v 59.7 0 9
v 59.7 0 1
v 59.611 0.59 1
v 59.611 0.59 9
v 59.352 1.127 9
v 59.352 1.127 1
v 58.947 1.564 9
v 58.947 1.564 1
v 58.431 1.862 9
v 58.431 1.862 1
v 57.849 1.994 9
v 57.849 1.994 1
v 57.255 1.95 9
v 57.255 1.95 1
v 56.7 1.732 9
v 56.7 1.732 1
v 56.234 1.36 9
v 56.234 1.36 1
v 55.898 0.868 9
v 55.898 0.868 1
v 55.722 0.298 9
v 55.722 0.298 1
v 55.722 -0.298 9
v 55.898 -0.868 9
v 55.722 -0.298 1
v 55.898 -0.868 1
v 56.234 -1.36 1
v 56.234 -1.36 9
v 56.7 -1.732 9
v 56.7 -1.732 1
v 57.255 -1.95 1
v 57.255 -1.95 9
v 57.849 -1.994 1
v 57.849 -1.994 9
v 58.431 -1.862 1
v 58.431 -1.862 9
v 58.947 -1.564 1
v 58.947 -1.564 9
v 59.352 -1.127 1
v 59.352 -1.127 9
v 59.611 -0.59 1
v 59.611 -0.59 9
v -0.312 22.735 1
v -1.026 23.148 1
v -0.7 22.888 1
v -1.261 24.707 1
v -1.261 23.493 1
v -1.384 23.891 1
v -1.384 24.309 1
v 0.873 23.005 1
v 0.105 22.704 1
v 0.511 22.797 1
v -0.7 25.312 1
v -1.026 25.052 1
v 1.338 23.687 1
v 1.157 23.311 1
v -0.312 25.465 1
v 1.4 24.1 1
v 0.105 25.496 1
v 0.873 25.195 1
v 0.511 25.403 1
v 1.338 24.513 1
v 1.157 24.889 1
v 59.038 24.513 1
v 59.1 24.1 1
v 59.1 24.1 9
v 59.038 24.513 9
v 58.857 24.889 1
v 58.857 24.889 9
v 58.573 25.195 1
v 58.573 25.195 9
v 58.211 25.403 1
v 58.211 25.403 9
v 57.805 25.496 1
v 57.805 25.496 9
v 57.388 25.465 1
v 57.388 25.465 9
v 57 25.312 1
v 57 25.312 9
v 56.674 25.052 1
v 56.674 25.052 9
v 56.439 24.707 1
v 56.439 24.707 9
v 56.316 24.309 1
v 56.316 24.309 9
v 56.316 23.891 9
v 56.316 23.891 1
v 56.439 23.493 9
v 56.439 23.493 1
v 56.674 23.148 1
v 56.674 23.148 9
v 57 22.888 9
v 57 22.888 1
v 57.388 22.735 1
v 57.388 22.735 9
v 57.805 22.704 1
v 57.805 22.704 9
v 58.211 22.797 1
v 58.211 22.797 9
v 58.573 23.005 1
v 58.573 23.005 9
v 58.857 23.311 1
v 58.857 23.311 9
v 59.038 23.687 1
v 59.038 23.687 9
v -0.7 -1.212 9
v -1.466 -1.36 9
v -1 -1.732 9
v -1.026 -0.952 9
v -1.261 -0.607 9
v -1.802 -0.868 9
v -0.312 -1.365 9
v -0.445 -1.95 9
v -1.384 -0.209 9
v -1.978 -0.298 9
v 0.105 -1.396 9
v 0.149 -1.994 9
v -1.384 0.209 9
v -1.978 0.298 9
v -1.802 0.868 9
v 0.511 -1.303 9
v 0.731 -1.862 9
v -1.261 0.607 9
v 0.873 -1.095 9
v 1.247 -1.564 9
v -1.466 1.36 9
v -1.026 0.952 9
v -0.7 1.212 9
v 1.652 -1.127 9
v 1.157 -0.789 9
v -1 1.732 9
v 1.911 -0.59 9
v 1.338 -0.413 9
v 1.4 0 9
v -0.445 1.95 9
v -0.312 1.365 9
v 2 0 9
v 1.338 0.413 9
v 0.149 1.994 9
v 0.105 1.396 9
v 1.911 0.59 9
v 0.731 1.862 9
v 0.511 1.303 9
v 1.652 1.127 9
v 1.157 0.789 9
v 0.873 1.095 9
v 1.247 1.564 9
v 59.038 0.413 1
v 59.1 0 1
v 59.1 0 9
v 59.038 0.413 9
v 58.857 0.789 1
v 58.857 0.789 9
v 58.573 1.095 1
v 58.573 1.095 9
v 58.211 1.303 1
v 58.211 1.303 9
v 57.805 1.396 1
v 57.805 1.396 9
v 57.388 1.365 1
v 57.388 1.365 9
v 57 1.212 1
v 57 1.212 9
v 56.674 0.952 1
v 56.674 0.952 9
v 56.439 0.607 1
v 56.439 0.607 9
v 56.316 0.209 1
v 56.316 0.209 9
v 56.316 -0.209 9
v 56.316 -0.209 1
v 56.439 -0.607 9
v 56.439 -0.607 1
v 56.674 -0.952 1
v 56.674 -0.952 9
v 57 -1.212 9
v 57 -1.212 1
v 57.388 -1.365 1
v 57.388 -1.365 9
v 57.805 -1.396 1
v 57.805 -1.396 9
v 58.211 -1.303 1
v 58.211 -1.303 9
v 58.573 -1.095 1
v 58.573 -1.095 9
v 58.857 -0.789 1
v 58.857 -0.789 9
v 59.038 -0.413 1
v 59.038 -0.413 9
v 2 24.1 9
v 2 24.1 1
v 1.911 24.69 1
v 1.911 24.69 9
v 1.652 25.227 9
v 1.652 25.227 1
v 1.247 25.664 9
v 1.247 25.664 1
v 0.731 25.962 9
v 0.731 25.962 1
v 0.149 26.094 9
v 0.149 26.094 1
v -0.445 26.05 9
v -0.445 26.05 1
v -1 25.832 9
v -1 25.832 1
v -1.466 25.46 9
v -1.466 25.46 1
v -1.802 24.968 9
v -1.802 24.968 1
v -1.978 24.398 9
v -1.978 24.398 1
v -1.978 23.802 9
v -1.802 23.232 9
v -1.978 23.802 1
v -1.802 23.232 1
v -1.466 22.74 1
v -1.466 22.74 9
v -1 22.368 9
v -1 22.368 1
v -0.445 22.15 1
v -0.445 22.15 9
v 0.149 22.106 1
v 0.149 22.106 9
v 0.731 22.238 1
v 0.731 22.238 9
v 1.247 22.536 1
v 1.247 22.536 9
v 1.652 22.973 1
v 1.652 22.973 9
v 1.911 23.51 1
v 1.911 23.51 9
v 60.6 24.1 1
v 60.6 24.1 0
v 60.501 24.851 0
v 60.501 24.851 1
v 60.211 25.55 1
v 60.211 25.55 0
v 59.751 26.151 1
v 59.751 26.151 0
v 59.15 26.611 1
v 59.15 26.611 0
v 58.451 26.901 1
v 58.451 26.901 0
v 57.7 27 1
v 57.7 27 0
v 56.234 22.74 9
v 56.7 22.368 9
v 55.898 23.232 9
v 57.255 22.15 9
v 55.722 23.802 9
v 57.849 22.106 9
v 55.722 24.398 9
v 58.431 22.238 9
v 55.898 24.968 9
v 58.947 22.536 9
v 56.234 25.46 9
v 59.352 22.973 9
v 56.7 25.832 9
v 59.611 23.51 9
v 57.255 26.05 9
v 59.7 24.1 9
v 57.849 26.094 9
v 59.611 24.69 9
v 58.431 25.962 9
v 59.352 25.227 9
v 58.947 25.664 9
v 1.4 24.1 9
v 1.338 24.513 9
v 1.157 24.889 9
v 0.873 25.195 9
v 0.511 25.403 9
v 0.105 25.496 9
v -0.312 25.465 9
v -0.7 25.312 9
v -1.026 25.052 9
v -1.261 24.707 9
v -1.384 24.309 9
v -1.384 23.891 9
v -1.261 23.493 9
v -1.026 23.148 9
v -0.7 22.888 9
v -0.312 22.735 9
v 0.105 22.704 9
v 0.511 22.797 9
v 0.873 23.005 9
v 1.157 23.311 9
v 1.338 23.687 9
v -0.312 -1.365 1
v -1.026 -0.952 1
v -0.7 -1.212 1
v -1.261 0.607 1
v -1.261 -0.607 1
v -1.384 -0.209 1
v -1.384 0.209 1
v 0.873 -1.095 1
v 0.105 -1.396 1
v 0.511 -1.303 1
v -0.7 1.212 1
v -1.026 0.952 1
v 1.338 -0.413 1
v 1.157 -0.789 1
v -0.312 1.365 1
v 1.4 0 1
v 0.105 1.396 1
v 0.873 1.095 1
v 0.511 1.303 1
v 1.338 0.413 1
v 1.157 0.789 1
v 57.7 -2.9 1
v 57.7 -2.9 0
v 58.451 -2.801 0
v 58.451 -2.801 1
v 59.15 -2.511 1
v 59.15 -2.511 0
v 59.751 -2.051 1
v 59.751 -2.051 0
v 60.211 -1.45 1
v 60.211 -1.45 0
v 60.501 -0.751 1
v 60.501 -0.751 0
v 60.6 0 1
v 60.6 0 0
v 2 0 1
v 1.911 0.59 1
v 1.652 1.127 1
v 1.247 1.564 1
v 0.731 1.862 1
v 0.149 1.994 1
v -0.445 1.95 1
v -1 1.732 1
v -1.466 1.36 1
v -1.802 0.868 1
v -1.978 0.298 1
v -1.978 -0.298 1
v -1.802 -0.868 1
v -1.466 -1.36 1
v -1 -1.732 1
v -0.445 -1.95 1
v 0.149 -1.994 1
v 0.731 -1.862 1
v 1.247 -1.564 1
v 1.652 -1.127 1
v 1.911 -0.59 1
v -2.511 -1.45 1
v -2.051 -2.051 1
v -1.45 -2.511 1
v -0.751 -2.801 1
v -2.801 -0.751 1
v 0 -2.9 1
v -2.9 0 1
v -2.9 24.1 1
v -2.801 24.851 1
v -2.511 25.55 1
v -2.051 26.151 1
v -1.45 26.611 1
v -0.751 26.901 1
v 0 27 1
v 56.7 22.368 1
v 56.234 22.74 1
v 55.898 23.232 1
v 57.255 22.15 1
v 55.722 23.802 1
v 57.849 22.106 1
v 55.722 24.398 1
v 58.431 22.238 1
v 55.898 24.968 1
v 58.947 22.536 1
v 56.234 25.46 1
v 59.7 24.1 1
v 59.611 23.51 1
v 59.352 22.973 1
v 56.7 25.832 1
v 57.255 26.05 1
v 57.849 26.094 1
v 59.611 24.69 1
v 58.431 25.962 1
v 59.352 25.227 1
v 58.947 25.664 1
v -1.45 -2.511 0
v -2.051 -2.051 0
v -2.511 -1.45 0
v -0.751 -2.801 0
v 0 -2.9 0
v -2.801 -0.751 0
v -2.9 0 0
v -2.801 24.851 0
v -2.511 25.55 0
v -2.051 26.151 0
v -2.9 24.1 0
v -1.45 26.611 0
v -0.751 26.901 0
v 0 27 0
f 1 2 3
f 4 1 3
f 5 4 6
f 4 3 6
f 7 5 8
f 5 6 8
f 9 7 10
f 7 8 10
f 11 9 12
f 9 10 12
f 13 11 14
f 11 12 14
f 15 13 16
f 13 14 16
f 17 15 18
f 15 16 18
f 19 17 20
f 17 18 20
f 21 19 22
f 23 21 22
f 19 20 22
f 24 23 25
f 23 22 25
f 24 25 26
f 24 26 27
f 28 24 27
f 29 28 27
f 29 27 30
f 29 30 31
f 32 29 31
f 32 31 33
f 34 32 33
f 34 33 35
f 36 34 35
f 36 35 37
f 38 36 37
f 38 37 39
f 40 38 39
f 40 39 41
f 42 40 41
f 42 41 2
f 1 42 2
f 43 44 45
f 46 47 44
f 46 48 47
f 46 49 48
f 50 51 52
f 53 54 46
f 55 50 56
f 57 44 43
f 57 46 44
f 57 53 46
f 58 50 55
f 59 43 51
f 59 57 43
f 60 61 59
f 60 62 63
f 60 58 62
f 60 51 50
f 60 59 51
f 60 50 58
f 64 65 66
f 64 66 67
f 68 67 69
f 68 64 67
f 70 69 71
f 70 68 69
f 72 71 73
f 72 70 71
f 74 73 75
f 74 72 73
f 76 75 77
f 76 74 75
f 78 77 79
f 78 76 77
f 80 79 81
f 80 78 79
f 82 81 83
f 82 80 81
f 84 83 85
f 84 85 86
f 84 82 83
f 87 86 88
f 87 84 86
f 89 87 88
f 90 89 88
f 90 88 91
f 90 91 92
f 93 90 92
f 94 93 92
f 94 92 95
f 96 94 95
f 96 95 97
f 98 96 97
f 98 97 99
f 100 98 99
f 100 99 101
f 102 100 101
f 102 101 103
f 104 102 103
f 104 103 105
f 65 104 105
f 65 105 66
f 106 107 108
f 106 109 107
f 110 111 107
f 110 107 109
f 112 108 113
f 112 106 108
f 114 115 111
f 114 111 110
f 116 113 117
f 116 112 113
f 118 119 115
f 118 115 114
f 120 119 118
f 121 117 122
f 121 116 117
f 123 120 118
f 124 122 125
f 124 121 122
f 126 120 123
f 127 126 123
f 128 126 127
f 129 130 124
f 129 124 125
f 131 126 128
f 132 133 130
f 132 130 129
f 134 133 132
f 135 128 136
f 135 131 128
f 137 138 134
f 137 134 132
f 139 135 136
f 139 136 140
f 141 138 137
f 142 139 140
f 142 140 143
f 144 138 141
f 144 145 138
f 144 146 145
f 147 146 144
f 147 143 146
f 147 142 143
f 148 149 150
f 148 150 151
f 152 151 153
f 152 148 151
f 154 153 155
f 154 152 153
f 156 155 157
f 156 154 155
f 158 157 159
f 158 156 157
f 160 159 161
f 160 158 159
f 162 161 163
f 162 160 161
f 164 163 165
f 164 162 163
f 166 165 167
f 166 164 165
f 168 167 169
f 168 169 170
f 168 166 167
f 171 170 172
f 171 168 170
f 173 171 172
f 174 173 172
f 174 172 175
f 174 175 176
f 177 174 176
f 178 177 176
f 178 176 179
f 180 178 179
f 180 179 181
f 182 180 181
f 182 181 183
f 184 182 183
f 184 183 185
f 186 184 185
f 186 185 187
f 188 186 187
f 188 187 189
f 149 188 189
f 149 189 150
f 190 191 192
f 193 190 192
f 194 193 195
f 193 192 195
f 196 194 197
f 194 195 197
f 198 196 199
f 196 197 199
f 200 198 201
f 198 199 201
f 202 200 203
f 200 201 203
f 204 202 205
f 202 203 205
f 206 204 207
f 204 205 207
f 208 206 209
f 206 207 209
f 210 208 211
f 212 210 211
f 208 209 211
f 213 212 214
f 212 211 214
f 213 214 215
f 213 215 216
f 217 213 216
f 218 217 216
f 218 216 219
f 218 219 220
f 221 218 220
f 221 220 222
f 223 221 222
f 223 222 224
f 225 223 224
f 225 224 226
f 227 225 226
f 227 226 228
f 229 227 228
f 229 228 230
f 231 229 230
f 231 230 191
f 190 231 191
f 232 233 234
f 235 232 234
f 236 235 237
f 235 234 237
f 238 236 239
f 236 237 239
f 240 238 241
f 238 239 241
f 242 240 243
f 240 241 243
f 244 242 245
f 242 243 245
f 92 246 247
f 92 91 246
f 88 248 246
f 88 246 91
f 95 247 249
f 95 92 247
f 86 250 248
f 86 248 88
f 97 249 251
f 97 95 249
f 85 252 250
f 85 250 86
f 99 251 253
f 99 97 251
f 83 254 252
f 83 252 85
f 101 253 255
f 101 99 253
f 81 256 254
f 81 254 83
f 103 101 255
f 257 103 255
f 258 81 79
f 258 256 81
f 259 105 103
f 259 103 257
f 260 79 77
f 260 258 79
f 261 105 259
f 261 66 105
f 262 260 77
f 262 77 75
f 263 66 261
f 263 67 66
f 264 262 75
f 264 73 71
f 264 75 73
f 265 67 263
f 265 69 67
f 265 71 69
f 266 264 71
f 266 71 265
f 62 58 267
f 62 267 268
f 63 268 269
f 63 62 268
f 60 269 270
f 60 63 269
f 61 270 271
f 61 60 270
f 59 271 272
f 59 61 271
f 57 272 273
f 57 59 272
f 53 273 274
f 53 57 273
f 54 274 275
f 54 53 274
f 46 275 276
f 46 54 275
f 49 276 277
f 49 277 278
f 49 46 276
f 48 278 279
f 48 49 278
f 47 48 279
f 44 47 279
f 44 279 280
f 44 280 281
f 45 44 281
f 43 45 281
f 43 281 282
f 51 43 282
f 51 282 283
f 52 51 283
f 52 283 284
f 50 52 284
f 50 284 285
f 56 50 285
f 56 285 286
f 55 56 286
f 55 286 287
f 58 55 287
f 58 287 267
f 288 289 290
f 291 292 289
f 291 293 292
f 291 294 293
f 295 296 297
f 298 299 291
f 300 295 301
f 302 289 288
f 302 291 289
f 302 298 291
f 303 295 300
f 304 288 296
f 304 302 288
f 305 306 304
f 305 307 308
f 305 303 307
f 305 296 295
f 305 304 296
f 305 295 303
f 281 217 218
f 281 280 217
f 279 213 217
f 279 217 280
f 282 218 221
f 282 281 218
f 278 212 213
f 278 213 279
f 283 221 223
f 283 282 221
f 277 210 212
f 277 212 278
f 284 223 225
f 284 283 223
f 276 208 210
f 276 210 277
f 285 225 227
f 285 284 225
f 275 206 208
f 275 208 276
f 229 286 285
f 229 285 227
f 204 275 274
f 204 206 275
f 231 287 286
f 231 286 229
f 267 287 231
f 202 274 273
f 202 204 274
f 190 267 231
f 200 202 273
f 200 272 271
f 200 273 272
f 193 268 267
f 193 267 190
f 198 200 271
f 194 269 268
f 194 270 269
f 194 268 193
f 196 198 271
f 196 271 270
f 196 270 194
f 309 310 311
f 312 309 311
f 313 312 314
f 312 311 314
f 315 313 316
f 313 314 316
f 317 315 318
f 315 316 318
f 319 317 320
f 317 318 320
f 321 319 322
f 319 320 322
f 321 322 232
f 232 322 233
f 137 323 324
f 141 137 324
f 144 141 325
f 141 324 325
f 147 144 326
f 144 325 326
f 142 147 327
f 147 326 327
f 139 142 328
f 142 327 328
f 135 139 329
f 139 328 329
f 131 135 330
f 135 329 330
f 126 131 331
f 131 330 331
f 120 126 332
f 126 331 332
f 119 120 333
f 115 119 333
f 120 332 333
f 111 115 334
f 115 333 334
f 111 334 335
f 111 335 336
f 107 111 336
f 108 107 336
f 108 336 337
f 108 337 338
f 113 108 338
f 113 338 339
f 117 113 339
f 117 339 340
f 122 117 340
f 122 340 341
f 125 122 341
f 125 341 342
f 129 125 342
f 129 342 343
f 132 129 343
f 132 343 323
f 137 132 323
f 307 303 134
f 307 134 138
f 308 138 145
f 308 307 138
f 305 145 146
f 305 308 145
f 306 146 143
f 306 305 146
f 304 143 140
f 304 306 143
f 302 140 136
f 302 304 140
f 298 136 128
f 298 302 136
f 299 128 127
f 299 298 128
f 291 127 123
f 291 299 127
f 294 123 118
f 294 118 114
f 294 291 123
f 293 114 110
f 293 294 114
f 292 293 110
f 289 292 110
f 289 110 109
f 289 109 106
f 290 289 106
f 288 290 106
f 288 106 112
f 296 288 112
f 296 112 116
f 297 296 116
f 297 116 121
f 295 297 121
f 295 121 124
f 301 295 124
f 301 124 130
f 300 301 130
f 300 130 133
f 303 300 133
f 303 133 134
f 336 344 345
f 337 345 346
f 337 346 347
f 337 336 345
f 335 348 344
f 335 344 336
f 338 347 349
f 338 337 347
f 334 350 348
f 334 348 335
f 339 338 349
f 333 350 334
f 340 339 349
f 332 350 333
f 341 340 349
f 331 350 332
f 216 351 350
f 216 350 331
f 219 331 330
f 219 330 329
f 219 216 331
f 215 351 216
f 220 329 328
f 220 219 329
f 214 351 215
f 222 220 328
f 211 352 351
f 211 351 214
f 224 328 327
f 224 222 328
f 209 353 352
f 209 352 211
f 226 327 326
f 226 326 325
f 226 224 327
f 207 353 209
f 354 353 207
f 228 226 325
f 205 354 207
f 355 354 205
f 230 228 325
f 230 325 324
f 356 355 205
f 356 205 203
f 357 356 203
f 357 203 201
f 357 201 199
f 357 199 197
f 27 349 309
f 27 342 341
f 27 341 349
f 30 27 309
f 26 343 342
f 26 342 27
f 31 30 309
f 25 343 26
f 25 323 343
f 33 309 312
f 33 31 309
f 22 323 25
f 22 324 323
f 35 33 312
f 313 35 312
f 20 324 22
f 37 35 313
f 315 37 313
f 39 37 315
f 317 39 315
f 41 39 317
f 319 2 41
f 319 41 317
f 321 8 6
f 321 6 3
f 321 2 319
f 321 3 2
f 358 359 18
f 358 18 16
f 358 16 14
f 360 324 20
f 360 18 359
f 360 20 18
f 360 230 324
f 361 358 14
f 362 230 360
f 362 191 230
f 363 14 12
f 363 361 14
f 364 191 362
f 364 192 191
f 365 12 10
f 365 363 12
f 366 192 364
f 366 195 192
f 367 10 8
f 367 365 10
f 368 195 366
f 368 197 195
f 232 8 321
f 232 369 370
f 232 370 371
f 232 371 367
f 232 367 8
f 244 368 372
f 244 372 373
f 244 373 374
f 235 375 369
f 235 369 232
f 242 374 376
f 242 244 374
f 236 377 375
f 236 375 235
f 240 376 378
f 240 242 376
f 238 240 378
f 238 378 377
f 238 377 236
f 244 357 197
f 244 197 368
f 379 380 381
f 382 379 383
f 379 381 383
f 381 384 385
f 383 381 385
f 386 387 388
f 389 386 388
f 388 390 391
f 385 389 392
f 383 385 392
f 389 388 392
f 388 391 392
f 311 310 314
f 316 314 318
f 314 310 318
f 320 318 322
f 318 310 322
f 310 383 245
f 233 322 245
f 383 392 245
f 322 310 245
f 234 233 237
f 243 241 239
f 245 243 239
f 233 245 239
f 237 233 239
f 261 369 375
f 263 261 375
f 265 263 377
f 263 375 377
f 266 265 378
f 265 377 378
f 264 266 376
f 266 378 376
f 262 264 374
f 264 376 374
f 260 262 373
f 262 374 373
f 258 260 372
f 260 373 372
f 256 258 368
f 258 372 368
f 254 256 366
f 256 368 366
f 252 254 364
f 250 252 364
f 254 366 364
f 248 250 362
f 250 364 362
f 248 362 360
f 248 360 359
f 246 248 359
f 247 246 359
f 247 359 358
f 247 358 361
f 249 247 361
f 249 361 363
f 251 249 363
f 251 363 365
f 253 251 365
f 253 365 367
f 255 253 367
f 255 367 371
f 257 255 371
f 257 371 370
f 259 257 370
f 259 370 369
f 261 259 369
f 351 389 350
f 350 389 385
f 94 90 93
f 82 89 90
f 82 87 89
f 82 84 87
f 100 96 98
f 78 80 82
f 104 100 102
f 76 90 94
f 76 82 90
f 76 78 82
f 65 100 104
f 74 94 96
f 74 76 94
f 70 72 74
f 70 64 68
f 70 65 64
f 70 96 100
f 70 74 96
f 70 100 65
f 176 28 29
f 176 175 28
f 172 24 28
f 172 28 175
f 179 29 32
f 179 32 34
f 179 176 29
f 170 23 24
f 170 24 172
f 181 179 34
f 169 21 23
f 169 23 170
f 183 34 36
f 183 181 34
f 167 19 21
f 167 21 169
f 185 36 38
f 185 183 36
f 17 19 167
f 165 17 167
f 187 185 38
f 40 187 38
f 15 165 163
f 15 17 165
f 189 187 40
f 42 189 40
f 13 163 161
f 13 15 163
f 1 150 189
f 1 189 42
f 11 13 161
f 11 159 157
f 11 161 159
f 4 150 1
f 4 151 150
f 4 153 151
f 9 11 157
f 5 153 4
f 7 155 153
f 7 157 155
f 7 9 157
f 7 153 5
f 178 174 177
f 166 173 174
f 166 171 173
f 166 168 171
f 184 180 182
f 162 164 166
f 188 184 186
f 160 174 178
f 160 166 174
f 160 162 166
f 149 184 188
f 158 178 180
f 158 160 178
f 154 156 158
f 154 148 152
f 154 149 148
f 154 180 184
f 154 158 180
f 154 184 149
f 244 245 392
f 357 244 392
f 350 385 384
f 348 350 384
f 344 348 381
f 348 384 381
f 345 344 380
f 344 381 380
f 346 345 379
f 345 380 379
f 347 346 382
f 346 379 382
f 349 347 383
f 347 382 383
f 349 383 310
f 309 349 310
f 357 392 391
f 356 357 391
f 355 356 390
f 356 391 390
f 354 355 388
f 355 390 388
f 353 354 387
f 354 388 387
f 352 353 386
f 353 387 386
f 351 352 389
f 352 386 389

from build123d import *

# Parameters (mm, degrees)
EXTRUDE_1_DEPTH = 1
SKETCH_3_R      = 2
SKETCH_3_R_2    = 1.4
EXTRUDE_3_DEPTH = 9


with BuildPart() as part:
    # 草图1 → 凸台-拉伸1 (new body)
    with BuildSketch(Plane.XY):
        with BuildLine():
            Line((0, -2.9), (57.7, -2.9))
            ThreePointArc((57.7, -2.9), (59.750609665, -2.050609665), (60.6, 0))
            Line((60.6, 0), (60.6, 24.1))
            ThreePointArc((60.6, 24.1), (59.750609665, 26.150609665), (57.7, 27))
            Line((57.7, 27), (0, 27))
            ThreePointArc((0, 27), (-2.050609665, 26.150609665), (-2.9, 24.1))
            Line((-2.9, 24.1), (-2.9, 0))
            ThreePointArc((-2.9, 0), (-2.050609665, -2.050609665), (0, -2.9))
        make_face()
    extrude(amount=EXTRUDE_1_DEPTH)

    # 草图3 → 凸台-拉伸3 (add)
    with BuildSketch(Plane.XY):
        Circle(SKETCH_3_R)
        Circle(SKETCH_3_R_2, mode=Mode.SUBTRACT)
        with Locations((0, 24.1)):
            Circle(SKETCH_3_R)
        with Locations((0, 24.1)):
            Circle(SKETCH_3_R_2, mode=Mode.SUBTRACT)
        with Locations((57.7, 0)):
            Circle(SKETCH_3_R)
        with Locations((57.7, 0)):
            Circle(SKETCH_3_R_2, mode=Mode.SUBTRACT)
        with Locations((57.7, 24.1)):
            Circle(SKETCH_3_R)
        with Locations((57.7, 24.1)):
            Circle(SKETCH_3_R_2, mode=Mode.SUBTRACT)
    extrude(amount=EXTRUDE_3_DEPTH)


solid = part.part
